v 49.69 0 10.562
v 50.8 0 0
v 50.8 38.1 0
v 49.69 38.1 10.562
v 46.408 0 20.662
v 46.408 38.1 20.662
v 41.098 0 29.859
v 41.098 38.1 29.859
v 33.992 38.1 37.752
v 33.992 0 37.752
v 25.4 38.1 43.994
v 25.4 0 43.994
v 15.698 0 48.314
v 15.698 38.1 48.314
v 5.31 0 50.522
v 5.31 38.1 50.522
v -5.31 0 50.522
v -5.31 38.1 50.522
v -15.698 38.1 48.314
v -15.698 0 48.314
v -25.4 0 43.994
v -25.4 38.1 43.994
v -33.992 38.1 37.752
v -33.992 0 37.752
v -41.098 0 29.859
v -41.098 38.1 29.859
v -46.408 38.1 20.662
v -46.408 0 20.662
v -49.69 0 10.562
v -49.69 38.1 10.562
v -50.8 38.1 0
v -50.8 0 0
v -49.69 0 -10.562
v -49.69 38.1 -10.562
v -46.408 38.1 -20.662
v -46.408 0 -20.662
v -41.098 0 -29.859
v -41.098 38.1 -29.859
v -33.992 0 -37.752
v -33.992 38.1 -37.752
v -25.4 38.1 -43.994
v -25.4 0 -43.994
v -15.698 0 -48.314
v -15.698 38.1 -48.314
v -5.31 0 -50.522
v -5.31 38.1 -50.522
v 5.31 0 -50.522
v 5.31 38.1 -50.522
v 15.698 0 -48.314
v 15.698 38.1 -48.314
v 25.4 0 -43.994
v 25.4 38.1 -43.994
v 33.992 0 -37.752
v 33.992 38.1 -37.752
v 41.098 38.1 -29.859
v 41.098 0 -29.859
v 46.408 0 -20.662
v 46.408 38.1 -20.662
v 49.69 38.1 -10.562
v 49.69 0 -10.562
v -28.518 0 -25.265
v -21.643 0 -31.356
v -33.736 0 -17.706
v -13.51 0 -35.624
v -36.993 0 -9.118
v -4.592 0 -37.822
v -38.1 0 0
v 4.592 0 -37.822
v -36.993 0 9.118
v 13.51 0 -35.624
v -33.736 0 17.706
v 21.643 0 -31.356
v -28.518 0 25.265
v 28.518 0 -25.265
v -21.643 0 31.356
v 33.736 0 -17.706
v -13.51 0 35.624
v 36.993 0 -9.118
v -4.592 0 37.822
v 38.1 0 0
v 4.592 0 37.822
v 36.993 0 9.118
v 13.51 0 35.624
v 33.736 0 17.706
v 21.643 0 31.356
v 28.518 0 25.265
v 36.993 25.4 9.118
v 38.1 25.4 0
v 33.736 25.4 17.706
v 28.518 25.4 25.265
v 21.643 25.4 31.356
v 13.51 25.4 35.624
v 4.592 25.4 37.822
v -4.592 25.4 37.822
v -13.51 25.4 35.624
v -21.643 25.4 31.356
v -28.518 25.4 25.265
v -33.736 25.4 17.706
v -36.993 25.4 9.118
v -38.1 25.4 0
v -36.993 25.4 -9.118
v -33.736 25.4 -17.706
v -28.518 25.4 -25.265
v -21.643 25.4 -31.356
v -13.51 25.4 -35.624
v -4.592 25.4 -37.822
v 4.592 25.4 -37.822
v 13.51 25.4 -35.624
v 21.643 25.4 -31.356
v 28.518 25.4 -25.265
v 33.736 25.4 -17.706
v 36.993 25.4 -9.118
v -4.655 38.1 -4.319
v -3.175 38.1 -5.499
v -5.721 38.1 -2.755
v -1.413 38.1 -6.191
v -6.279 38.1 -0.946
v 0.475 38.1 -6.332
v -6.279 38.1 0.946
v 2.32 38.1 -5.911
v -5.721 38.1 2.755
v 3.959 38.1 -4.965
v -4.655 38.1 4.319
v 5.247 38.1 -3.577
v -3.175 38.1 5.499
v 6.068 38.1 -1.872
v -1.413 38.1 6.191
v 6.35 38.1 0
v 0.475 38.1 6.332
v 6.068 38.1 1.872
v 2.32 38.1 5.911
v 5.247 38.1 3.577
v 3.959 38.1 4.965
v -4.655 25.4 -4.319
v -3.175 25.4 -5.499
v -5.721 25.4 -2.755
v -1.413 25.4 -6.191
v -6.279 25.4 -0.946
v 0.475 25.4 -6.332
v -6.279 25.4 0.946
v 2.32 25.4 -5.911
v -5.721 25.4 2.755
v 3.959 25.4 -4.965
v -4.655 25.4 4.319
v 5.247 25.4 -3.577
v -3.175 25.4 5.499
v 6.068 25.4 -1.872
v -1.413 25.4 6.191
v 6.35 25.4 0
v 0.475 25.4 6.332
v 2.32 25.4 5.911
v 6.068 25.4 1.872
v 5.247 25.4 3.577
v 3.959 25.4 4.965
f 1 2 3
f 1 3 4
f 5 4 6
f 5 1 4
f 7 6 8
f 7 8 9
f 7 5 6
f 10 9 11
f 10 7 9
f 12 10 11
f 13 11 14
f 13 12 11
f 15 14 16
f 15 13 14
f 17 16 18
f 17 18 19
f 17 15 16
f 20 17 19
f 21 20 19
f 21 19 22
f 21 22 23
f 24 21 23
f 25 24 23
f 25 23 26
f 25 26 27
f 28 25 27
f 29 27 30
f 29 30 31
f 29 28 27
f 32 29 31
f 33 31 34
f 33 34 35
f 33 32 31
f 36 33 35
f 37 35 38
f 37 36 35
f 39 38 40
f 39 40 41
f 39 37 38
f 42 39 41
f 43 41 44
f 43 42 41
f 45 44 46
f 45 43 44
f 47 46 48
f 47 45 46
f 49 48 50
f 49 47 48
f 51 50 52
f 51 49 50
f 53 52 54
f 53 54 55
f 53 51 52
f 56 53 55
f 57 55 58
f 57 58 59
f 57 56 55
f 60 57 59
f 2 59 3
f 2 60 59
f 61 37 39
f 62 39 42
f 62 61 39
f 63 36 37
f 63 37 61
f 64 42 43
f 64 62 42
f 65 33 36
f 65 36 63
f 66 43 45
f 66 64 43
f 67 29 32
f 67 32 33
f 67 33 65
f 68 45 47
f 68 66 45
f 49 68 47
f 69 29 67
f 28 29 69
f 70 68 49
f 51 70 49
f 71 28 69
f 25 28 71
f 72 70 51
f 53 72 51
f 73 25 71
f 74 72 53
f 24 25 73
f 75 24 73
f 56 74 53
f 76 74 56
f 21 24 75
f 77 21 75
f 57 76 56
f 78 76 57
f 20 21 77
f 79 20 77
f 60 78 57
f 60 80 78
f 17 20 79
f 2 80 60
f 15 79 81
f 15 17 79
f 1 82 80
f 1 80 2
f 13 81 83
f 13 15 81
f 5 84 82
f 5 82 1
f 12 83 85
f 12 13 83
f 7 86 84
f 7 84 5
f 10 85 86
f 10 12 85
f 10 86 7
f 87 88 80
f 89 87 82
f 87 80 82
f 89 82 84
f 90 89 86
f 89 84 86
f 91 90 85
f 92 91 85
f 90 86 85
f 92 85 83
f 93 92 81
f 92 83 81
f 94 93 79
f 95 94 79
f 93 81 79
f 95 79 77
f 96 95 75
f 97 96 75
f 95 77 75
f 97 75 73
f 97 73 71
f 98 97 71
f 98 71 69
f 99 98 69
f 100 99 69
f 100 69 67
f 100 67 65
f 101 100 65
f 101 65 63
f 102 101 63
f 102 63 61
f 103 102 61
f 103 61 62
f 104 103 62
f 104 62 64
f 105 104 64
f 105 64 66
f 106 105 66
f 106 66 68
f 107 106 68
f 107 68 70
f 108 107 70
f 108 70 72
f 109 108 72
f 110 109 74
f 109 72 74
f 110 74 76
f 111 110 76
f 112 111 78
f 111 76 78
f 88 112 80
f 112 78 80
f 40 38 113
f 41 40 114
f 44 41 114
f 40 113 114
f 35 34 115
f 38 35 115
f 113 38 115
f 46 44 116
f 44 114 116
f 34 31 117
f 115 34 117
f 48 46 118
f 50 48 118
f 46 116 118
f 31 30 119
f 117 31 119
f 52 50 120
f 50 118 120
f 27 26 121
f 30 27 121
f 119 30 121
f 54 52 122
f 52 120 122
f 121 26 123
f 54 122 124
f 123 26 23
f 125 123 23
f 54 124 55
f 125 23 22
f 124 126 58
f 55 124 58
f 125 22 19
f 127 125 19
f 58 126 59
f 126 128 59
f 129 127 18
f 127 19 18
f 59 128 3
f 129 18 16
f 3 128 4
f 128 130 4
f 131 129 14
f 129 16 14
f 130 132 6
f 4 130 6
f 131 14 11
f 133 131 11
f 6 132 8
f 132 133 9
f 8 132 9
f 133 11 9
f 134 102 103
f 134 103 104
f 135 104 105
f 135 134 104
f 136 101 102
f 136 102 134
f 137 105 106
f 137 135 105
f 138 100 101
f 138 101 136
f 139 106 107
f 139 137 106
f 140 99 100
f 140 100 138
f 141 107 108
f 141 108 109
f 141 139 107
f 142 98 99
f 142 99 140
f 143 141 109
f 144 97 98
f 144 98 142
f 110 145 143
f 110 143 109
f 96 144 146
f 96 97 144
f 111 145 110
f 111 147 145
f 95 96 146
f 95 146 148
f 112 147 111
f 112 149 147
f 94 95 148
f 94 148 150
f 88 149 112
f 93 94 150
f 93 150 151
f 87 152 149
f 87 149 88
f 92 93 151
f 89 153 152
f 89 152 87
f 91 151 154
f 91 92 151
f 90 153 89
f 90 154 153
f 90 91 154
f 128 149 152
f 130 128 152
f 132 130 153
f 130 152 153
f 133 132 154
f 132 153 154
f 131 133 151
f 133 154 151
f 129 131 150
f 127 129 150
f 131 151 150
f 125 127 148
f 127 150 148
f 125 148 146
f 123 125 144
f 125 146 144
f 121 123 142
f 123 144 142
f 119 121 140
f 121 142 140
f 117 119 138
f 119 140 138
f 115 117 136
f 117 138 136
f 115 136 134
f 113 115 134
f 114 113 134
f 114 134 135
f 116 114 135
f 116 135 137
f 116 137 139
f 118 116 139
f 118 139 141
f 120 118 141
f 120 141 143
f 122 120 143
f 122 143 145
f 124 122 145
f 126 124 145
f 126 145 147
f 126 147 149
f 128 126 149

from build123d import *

# Parameters (mm, degrees)
F0_R     = 50.8
F1_DEPTH = 38.1
F2_T     = -12.7
F3_R     = 6.35
F4_DEPTH = 38.101


with BuildPart() as f1:
    # F0 (on Front) → F1 (new body)
    with BuildSketch(Plane.XZ):
        Circle(F0_R)
    extrude(amount=-F1_DEPTH)

    # F2
    f2_openings = [f1.faces().sort_by_distance(p)[0] for p in [
        (0, 0, 0),
    ]]
    offset(amount=F2_T, openings=f2_openings)

    # F3 (on Front) → F4 (cut, through all)
    with BuildSketch(Plane.XZ):
        Circle(F3_R)
    extrude(amount=-F4_DEPTH, mode=Mode.SUBTRACT)


solid = f1.part
